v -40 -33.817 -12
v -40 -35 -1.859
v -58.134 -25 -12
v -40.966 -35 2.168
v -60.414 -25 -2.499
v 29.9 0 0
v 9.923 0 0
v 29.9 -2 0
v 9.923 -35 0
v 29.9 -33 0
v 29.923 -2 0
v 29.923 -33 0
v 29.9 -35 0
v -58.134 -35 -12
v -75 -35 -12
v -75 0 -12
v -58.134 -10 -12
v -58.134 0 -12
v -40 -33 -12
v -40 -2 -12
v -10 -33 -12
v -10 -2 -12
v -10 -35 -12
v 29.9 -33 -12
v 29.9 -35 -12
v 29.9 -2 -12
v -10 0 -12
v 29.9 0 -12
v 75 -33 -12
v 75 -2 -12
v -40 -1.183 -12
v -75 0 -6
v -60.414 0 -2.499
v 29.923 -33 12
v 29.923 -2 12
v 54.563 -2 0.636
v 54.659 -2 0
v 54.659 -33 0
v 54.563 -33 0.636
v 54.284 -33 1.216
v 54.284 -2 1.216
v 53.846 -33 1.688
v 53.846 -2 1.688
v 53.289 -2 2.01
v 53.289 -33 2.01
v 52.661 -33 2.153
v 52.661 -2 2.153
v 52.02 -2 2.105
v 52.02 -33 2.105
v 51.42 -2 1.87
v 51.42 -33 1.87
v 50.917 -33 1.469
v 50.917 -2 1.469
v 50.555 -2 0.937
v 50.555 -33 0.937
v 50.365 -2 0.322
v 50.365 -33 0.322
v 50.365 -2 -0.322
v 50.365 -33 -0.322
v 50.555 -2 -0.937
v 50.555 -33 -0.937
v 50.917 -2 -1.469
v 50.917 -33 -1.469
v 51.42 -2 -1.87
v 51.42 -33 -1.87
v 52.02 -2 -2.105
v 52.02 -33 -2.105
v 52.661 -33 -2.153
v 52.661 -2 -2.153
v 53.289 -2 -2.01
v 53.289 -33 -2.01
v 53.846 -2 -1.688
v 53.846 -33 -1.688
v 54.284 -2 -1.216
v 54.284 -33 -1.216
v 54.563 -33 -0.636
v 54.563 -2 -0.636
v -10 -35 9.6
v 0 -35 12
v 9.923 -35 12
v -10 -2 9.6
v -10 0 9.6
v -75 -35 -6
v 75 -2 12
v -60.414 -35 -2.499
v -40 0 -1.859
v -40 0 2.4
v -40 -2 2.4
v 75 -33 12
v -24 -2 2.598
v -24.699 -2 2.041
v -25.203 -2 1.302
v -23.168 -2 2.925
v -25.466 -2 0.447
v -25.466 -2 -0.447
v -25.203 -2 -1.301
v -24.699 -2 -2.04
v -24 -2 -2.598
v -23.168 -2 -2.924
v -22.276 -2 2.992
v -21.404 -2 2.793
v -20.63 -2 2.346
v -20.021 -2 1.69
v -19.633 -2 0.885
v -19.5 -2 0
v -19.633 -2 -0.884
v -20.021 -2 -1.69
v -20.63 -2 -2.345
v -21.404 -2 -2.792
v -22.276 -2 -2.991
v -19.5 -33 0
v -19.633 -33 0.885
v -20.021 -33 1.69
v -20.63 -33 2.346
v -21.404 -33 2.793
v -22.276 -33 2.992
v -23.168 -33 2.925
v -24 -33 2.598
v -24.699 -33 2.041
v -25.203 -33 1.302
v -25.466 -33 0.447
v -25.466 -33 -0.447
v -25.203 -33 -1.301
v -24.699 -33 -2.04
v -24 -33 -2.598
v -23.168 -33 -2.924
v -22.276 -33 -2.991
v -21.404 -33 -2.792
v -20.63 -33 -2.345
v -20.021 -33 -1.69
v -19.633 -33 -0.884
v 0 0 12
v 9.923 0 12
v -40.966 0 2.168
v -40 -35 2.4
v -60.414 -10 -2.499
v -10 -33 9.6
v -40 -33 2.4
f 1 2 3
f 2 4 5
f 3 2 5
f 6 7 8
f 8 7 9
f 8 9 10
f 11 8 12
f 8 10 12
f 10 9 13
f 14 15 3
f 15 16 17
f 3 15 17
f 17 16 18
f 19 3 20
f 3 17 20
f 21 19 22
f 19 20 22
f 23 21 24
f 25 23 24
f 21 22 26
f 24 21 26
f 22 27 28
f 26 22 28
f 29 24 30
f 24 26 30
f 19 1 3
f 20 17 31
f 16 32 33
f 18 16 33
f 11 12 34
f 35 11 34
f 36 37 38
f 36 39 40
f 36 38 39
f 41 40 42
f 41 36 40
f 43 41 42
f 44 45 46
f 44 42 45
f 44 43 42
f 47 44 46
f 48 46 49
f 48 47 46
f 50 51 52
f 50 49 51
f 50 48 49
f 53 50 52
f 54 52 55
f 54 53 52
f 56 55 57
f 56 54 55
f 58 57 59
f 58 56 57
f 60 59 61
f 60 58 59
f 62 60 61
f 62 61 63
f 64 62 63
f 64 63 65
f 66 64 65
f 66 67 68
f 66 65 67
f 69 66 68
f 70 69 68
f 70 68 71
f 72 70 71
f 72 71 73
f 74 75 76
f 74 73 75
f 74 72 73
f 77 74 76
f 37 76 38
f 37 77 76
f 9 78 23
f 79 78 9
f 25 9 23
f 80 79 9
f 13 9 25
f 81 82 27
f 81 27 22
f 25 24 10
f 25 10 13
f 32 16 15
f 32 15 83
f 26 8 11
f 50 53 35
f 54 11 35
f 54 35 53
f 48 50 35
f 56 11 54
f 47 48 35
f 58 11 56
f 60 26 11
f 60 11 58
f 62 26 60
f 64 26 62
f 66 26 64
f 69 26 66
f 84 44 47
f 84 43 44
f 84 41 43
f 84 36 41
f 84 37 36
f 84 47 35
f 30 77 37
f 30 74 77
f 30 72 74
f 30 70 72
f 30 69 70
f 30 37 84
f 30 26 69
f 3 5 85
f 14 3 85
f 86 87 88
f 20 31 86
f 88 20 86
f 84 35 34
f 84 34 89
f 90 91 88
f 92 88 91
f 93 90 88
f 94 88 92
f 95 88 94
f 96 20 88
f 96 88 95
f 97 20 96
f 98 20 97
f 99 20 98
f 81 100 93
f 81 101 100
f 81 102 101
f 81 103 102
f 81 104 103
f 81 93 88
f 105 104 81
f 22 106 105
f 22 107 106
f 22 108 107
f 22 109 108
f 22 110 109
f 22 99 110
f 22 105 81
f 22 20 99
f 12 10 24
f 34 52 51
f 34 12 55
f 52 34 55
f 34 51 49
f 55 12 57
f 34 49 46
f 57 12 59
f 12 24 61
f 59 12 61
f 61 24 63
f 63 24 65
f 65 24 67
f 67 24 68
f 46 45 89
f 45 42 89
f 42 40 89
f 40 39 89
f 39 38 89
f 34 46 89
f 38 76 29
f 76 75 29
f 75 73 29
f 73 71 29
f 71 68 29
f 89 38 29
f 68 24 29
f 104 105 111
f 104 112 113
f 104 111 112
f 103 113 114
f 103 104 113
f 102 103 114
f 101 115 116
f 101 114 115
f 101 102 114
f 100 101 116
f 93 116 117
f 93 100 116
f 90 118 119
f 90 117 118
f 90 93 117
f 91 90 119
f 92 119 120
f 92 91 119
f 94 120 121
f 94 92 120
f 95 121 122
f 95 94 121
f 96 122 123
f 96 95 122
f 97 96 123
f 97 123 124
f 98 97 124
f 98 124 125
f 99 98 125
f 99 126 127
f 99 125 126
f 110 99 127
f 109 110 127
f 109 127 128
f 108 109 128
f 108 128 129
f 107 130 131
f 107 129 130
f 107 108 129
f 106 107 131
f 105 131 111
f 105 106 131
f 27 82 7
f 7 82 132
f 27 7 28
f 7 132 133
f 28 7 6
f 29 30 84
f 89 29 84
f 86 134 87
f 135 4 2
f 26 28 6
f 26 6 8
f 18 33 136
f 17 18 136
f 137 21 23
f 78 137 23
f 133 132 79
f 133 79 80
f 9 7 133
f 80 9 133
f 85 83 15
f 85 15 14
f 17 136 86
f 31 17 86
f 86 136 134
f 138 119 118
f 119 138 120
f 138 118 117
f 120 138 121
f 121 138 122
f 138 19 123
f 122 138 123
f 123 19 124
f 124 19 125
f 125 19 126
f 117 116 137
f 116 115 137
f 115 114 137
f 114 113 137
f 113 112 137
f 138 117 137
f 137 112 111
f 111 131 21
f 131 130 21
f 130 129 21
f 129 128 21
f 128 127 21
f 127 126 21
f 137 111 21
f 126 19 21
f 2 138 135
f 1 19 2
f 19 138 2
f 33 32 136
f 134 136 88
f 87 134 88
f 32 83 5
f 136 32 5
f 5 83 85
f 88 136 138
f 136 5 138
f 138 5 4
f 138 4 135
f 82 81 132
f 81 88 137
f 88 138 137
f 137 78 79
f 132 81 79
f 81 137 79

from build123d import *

# Parameters (mm, degrees)
F0_W      = 150
F0_H      = 24
F0_R      = 3
F0_R_2    = 2.1592760918
F1_DEPTH  = 35
F3_DEPTH  = 35
F5_DEPTH  = 25
F6_W      = 20
F6_H      = 12
F7_DEPTH  = 35
F8_W      = 30
F8_H      = 2
F9_DEPTH  = 25
F10_W     = 45.1
F10_H     = 2
F11_DEPTH = 25


with BuildPart() as f1:
    # F0 (on Front) → F1 (new body)
    with BuildSketch(Plane.XZ):
        Rectangle(F0_W, F0_H)
        with Locations((-22.5, 0.0003034234)):
            Circle(F0_R, mode=Mode.SUBTRACT)
        with Locations((52.5, 0)):
            Circle(F0_R_2, mode=Mode.SUBTRACT)
    extrude(amount=F1_DEPTH)

    # F2 (on face) → F3 (cut)
    with BuildSketch(Plane.XZ.offset(35)):
        Polygon((-75, 12), (-75, -6), (0, 12), align=None)
    extrude(amount=-F3_DEPTH, mode=Mode.SUBTRACT)

    # F4 (on face) → F5 (cut)
    with BuildSketch(Plane(origin=(-2.7231467474, 0, 11.3464447806), x_dir=(0.972387302, 0, 0.2333729525), z_dir=(-0.2333729525, 0, 0.972387302))):
        Polygon((-59.3292853634, -25), (-59.3292853634, -35), (-39.3292853634, -35), align=None)
        Polygon((-39.3292853634, 0), (-59.3292853634, 0), (-59.3292853634, -10), align=None)
    extrude(amount=-F5_DEPTH, mode=Mode.SUBTRACT)

    # F6 (on face) → F7 (cut)
    with BuildSketch(Plane.XZ.offset(35)):
        with Locations((19.9226795137, 6)):
            Rectangle(F6_W, F6_H)
    extrude(amount=-F7_DEPTH, mode=Mode.SUBTRACT)

    # F8 (on face) → F9 (cut)
    with BuildSketch(Plane(origin=(0, 0, -12), x_dir=(1, 0, 0), z_dir=(0, 0, -1))):
        with Locations((-25, 34)):
            Rectangle(F8_W, F8_H)
        with Locations((-25, 1)):
            Rectangle(F8_W, F8_H)
    extrude(amount=-F9_DEPTH, mode=Mode.SUBTRACT)

    # F10 (on face) → F11 (cut)
    with BuildSketch(Plane(origin=(0, 0, -12), x_dir=(1, 0, 0), z_dir=(0, 0, -1))):
        with Locations((52.45, 34)):
            Rectangle(F10_W, F10_H)
        with Locations((52.45, 1)):
            Rectangle(F10_W, F10_H)
    extrude(amount=-F11_DEPTH, mode=Mode.SUBTRACT)


solid = f1.part
